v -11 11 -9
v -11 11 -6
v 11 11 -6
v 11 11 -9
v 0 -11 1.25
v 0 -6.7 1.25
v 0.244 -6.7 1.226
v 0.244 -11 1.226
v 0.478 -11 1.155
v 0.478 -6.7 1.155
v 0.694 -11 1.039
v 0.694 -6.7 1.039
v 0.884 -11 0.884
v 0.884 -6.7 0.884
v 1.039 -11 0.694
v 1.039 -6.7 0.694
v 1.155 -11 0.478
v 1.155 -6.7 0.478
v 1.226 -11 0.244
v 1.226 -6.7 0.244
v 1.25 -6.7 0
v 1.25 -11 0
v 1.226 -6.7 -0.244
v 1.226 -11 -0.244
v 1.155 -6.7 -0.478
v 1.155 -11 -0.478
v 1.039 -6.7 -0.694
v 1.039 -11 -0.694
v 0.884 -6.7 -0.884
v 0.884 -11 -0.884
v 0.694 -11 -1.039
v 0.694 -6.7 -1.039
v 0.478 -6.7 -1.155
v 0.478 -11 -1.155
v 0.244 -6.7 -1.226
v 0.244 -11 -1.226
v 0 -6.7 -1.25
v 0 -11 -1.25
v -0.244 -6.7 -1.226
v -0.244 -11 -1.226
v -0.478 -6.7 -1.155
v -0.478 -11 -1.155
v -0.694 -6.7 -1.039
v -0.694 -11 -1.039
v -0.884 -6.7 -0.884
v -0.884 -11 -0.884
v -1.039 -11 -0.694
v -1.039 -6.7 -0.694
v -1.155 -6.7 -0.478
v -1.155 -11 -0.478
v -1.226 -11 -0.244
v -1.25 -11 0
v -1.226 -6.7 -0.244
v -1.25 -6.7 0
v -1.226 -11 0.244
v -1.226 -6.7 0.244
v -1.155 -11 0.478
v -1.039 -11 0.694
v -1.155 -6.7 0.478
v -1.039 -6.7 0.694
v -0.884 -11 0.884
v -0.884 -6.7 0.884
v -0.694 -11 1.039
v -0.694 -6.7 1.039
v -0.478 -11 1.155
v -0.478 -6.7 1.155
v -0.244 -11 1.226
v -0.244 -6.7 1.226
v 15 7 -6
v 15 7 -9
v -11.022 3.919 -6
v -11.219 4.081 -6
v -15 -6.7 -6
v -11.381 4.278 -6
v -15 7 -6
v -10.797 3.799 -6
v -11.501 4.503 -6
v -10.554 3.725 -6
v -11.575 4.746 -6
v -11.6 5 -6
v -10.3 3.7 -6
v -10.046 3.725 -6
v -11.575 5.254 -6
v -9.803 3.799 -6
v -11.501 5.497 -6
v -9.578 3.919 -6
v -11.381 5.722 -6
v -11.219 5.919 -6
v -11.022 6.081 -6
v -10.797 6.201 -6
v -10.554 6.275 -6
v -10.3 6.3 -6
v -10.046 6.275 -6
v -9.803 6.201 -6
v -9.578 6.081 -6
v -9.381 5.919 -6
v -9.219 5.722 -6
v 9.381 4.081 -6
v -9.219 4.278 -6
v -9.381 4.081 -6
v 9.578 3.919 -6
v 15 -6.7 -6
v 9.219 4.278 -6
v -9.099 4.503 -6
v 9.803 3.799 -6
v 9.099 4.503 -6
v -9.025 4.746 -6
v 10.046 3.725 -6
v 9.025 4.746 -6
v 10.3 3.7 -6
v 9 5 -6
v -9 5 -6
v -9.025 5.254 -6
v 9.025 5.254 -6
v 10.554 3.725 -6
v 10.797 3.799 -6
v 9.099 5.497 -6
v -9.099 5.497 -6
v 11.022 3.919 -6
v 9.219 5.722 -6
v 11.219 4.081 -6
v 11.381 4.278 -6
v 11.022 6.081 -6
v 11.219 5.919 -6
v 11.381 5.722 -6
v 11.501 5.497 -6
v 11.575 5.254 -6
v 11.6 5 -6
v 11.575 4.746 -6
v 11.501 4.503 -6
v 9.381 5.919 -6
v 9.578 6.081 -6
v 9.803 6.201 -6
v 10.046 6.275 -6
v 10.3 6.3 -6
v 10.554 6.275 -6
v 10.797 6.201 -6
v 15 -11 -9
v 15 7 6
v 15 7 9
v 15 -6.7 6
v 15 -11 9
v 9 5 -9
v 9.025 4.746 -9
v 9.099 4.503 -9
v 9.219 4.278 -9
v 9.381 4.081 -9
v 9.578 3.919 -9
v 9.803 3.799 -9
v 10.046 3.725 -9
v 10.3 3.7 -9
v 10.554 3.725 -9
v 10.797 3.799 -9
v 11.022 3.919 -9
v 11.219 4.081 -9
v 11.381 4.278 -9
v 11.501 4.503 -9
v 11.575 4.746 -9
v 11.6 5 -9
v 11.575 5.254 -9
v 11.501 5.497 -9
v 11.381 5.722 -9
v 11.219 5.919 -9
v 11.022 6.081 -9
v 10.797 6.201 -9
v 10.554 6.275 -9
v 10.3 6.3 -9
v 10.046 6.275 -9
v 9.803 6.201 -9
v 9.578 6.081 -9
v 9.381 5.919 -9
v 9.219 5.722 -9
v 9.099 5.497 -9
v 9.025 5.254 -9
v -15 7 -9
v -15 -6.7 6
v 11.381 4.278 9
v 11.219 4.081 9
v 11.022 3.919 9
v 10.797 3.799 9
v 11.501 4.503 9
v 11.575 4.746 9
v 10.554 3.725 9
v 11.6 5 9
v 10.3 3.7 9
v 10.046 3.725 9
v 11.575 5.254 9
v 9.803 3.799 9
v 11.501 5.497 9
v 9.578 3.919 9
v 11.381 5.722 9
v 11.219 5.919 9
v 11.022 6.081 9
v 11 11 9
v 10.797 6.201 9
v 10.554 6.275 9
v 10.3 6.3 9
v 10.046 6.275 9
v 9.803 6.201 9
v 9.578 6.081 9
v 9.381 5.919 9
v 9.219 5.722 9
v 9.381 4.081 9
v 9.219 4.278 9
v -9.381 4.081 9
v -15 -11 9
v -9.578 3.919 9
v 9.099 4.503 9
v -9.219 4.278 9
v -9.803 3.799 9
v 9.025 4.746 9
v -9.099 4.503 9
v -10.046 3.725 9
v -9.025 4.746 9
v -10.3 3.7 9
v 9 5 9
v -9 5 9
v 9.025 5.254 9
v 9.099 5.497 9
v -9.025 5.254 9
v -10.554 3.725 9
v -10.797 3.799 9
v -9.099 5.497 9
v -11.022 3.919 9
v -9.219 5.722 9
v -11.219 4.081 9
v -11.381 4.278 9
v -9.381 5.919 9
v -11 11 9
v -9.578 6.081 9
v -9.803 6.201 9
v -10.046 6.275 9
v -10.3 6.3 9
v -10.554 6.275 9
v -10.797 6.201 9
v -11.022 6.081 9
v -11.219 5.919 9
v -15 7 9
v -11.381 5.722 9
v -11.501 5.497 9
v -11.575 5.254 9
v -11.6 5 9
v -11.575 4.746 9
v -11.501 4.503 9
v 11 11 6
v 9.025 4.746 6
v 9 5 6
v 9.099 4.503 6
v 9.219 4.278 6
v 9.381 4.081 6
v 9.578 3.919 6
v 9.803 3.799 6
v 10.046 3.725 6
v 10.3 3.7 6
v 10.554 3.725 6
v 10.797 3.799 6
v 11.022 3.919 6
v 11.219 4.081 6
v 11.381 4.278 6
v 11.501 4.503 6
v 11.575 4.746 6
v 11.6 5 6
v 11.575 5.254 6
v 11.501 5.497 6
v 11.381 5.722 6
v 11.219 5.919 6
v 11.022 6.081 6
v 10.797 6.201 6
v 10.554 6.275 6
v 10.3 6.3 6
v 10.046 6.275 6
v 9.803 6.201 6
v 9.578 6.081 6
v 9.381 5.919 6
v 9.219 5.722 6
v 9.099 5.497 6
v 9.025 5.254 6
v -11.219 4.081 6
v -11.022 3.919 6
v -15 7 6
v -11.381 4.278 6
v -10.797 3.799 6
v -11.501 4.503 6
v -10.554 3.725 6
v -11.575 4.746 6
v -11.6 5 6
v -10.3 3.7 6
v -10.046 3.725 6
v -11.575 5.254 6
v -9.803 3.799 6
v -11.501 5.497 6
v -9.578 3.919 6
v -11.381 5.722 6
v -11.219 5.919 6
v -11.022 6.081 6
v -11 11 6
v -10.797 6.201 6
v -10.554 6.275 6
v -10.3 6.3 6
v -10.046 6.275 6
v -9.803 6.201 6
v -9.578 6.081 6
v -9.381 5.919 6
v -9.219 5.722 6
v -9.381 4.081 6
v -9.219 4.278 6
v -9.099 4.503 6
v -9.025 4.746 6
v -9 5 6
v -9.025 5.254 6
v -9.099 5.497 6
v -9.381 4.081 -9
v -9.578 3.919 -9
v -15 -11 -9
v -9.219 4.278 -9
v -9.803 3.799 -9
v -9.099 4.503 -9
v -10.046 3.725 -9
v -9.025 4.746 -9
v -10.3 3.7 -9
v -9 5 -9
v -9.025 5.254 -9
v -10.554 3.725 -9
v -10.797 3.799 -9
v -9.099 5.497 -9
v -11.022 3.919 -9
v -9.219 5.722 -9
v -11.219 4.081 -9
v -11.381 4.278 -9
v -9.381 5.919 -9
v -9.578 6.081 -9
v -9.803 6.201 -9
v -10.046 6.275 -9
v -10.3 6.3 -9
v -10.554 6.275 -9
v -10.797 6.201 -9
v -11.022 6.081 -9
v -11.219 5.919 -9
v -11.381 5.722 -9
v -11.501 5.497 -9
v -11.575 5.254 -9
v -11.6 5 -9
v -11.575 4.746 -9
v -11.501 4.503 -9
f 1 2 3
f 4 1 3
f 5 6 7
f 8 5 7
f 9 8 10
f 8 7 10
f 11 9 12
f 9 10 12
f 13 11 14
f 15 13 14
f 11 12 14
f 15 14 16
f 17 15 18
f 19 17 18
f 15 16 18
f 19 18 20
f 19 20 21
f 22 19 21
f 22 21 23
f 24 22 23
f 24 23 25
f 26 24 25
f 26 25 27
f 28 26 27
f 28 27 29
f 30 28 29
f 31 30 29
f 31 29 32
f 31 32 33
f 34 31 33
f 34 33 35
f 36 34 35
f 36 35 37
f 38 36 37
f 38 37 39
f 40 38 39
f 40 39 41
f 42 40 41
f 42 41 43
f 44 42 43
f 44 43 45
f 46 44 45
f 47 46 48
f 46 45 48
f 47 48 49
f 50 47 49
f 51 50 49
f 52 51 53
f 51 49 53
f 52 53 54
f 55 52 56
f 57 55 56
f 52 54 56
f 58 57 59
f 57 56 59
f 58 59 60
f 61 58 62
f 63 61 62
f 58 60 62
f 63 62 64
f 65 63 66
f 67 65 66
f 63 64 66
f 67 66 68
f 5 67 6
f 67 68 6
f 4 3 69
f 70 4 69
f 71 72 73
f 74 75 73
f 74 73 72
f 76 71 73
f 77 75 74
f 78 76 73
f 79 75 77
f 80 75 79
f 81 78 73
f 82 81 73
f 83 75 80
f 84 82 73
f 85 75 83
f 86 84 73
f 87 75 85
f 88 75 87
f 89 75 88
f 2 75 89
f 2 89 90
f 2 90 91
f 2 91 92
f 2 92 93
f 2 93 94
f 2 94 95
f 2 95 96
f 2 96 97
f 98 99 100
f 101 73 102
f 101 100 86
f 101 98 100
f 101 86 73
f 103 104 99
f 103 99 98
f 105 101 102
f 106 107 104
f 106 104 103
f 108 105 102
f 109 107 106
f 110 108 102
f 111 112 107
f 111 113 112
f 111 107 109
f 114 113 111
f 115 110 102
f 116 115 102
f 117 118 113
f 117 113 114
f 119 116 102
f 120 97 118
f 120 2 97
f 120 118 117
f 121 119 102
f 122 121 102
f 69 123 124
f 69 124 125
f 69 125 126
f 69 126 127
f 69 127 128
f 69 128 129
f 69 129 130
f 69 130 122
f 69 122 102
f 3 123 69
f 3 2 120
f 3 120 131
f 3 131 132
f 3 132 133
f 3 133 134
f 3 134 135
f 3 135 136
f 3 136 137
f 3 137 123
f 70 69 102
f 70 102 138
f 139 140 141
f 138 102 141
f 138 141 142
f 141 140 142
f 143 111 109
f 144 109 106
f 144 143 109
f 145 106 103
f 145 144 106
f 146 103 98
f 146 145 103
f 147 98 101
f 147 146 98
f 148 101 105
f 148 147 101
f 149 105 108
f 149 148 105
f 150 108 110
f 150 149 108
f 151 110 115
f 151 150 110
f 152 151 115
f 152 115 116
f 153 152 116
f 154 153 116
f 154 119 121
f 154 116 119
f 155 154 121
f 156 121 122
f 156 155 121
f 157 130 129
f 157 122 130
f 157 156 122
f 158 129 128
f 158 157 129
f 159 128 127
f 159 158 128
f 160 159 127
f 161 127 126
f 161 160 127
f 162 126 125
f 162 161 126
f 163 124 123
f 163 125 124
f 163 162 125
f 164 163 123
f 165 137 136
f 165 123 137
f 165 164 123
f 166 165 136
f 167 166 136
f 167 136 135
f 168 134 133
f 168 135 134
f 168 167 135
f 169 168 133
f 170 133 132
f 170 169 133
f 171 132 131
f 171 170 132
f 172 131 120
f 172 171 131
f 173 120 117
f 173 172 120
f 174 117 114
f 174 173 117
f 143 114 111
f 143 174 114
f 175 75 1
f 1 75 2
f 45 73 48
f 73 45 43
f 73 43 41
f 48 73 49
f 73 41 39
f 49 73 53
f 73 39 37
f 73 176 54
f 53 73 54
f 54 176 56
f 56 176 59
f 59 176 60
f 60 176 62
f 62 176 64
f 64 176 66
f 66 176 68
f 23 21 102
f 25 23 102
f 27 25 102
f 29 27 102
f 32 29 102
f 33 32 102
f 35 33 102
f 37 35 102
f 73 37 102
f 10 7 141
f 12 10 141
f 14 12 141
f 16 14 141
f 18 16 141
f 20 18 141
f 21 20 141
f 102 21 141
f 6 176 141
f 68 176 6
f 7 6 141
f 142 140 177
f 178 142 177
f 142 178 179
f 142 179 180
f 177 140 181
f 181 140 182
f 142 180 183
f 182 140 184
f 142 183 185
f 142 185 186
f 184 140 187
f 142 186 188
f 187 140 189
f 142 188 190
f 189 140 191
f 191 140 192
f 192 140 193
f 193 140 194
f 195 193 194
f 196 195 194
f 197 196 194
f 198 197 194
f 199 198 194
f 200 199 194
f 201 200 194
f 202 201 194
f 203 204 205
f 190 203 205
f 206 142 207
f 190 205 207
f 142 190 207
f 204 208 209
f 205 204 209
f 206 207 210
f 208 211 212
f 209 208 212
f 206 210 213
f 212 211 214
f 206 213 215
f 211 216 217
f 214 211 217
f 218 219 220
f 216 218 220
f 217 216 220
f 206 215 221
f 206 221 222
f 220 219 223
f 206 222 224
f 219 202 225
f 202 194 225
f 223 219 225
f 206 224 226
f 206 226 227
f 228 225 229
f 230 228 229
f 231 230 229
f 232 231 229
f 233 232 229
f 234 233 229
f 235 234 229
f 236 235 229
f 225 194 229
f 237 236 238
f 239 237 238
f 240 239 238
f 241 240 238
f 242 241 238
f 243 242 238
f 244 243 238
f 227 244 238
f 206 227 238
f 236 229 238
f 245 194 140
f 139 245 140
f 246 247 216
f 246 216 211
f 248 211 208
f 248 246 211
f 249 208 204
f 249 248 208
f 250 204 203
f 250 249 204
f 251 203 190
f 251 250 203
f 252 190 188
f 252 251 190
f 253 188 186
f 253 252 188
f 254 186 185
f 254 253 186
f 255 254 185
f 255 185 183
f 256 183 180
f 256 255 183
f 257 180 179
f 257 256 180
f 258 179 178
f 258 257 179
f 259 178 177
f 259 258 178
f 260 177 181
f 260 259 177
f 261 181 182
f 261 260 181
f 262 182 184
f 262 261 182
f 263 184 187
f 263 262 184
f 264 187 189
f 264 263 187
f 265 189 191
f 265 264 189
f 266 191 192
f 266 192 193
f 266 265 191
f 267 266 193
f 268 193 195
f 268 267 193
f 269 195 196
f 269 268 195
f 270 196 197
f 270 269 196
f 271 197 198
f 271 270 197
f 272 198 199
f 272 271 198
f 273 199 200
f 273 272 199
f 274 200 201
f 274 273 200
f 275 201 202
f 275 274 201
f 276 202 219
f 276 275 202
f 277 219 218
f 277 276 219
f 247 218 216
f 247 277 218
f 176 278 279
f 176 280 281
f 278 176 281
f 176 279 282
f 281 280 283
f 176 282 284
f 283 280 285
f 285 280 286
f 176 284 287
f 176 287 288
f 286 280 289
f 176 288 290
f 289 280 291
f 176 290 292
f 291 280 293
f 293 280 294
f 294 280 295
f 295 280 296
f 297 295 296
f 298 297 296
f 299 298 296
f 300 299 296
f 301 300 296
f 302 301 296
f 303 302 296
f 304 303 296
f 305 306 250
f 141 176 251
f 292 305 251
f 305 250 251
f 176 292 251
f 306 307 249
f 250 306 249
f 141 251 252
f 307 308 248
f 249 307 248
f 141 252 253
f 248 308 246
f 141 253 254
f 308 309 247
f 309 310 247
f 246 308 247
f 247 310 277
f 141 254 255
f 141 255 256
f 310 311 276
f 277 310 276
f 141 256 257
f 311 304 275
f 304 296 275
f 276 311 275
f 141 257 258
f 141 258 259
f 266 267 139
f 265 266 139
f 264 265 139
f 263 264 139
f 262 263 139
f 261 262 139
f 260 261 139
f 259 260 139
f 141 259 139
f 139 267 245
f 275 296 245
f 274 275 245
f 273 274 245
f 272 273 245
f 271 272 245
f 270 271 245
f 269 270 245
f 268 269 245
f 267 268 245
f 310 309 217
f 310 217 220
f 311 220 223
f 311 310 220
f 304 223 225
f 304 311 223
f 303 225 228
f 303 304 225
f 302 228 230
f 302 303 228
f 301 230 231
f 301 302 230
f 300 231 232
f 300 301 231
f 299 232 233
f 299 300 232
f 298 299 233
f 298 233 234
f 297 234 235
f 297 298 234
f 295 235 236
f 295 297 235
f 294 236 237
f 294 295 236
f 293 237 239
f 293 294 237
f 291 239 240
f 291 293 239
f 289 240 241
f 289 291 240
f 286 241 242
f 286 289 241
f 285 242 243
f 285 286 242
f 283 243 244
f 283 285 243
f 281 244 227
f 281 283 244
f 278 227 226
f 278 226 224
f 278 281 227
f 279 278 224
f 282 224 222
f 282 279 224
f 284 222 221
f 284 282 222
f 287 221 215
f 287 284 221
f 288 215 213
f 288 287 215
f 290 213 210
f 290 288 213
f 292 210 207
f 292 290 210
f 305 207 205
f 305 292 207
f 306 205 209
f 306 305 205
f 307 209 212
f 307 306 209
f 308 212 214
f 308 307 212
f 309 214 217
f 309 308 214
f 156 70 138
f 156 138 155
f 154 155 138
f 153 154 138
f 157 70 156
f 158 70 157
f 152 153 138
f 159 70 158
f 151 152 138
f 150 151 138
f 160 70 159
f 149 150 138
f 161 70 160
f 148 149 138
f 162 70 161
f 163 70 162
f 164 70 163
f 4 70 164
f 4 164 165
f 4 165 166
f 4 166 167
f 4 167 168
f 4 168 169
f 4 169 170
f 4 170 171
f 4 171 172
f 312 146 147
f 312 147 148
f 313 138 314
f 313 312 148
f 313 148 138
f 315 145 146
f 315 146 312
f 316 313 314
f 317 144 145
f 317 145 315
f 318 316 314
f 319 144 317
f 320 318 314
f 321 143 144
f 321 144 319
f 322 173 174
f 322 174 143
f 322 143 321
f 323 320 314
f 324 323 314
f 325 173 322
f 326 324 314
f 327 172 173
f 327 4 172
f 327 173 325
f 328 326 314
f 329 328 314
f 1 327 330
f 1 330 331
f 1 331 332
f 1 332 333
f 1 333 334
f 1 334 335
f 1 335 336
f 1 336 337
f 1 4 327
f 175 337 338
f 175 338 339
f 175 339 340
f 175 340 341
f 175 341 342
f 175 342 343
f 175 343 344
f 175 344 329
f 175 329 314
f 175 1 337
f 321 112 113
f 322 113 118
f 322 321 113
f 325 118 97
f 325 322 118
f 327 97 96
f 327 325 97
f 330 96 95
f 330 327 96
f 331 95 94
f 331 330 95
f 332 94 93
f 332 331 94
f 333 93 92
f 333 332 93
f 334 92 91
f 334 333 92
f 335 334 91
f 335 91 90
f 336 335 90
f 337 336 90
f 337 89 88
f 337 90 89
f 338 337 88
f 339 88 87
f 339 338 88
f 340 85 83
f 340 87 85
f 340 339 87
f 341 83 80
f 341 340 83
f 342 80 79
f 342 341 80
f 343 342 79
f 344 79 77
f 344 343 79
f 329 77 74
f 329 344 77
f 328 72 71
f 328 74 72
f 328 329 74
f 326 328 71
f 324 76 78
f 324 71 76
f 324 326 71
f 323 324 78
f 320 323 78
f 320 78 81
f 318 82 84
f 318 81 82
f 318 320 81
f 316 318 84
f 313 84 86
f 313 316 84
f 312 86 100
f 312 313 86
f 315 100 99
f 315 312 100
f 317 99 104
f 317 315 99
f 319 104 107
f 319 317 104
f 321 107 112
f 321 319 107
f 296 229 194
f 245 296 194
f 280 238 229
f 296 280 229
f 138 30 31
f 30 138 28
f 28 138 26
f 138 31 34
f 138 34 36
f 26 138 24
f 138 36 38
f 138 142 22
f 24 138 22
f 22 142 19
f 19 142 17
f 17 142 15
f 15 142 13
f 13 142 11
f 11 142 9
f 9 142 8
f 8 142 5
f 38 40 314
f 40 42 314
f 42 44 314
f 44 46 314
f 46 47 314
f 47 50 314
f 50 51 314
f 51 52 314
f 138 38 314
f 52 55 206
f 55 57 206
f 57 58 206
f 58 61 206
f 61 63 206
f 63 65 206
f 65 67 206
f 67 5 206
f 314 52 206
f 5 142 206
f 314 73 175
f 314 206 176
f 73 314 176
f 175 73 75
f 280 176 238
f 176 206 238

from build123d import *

# Parameters (mm, degrees)
SKETCH_2_R          = 1.3
EXTRUDE_1_DEPTH     = 9
SKETCH_3_W          = 30
SKETCH_3_H          = 20.835575778
CUT_EXTRUDE_1_DEPTH = 6
CUT_EXTRUDE_2_REACH = 22.664
SKETCH_4_R          = 1.25


with BuildPart() as part:
    # 草图2 → 凸台-拉伸1 (new, symmetric)
    with BuildSketch(Plane.XY):
        Polygon((-11, 11), (11, 11), (15, 7), (15, -11), (-15, -11), (-15, 7), align=None)
        with Locations((-10.3, 5)):
            Circle(SKETCH_2_R, mode=Mode.SUBTRACT)
        with Locations(Location((10.3, 5, 0), (0, 0, 180))):
            Circle(SKETCH_2_R, mode=Mode.SUBTRACT)
    extrude(amount=EXTRUDE_1_DEPTH, both=True)

    # 草图3 → 切除-拉伸1 (cut, symmetric)
    with BuildSketch(Plane.XY):
        with Locations((0, 3.717787889)):
            Rectangle(SKETCH_3_W, SKETCH_3_H)
    extrude(amount=CUT_EXTRUDE_1_DEPTH, both=True, mode=Mode.SUBTRACT)

    # 草图4 → 切除-拉伸2 (cut, up to next)
    with BuildSketch(Plane(origin=(0, 0, 0), x_dir=(1, 0, 0), z_dir=(0, 1, 0)), mode=Mode.PRIVATE) as cut_extrude_2_sk1:
        with Locations(Location((0, 0, 0), (0, 0, 270))):
            Circle(SKETCH_4_R)
    cut_extrude_2_tool1 = extrude(cut_extrude_2_sk1.sketch, amount=-CUT_EXTRUDE_2_REACH, mode=Mode.PRIVATE) & part.part
    add(cut_extrude_2_tool1.solids().sort_by_distance((0, 0, 0))[0], mode=Mode.SUBTRACT)


solid = part.part
